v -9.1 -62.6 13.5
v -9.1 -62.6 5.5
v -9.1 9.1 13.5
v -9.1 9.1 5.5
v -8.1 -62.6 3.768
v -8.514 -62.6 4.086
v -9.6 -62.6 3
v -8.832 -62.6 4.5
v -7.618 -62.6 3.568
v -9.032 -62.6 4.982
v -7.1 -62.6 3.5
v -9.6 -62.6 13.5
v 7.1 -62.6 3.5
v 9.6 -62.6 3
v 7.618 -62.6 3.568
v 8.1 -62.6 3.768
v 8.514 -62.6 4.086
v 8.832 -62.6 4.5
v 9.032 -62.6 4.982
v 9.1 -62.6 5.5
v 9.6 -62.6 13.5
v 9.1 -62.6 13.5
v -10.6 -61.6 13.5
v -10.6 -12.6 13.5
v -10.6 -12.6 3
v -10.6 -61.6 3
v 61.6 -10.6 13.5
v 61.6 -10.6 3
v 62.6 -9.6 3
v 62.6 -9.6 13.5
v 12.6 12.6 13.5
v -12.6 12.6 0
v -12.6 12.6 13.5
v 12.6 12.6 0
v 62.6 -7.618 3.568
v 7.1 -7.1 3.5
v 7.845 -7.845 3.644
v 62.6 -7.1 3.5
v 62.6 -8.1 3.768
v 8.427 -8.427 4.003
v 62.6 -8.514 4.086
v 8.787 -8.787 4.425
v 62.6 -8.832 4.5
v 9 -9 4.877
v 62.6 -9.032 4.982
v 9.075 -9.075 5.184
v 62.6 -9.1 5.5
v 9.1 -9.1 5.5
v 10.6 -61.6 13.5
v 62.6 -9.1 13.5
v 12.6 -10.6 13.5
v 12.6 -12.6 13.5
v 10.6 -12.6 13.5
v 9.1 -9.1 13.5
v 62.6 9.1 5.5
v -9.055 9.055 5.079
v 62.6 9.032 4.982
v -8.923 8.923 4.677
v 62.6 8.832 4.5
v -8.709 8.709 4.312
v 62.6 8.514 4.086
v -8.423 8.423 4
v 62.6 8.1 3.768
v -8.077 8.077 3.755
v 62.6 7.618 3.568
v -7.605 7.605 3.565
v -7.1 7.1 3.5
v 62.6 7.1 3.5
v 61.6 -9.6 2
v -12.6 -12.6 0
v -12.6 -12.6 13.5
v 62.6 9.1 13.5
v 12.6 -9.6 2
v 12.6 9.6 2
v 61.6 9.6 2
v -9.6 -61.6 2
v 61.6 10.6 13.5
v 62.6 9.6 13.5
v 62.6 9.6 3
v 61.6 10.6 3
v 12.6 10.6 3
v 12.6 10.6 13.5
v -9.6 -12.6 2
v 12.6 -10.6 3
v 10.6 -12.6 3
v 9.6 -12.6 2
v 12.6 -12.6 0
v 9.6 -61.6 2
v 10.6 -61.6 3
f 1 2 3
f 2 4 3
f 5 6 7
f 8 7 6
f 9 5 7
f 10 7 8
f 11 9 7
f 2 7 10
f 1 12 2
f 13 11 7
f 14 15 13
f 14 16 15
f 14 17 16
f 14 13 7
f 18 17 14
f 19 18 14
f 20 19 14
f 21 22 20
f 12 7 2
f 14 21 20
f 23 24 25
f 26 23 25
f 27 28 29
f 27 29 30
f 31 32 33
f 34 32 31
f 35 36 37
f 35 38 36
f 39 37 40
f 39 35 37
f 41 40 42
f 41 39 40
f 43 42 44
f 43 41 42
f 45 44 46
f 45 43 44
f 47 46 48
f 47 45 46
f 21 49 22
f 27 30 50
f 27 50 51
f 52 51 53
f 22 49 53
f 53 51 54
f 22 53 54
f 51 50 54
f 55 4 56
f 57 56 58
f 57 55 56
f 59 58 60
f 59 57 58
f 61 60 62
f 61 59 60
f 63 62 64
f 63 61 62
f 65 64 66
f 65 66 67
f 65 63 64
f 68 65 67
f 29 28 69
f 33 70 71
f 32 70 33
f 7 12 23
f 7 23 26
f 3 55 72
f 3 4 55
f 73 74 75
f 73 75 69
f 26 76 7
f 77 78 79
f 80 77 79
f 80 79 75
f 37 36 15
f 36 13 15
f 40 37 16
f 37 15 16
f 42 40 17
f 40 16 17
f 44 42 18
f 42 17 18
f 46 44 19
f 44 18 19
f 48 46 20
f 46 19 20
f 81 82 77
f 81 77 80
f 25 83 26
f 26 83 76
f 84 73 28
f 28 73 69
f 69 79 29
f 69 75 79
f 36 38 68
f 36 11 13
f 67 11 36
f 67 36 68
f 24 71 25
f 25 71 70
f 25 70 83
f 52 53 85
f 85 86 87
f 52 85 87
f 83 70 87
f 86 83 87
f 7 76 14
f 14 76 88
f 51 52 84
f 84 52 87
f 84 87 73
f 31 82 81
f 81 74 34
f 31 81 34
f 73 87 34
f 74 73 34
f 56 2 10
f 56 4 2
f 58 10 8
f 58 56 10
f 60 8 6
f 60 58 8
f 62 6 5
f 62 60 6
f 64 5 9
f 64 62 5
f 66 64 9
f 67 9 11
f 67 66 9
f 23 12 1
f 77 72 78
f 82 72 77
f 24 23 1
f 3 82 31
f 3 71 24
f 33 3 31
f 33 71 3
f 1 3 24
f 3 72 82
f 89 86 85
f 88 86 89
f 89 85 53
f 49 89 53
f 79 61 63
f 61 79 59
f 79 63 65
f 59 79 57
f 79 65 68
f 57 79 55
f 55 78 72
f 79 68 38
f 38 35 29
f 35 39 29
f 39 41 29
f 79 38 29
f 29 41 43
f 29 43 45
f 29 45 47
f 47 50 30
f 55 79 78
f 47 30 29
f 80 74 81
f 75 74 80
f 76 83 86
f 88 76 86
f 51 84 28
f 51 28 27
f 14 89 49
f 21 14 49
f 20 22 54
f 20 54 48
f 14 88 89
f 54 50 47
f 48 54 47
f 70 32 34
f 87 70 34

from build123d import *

# Parameters (mm, degrees)
SKETCH_W        = 25.2
SKETCH_H        = 25.2
PAD_DEPTH       = 13.5
THICKNESS_T     = -3.5
SKETCH001_W     = 18.2
SKETCH001_H     = 10
POCKET_DEPTH    = 3.5
PAD001_DEPTH    = 50
CHAMFER_SIZE    = 1
SKETCH003_W     = 18.2
SKETCH003_H     = 10
POCKET001_DEPTH = 3.5
PAD002_DEPTH    = 50
CHAMFER001_SIZE = 1
FILLET_R        = 2
FILLET001_R     = 2
FILLET002_R     = 2


with BuildPart() as part:
    # Sketch → Pad (new body)
    with BuildSketch(Plane.XY):
        Rectangle(SKETCH_W, SKETCH_H)
    extrude(amount=PAD_DEPTH)

    # Thickness
    thickness_openings = [part.faces().sort_by_distance(p)[0] for p in [
        (0, 0, 13.5),
    ]]
    offset(amount=THICKNESS_T, openings=thickness_openings, kind=Kind.INTERSECTION)

    # Sketch001 (on Face2 of Thickness) → Pocket (cut)
    with BuildSketch(Plane.XZ.offset(12.6)):
        with Locations((0, 8.5)):
            Rectangle(SKETCH001_W, SKETCH001_H)
    extrude(amount=-POCKET_DEPTH, mode=Mode.SUBTRACT)

    # Sketch002 (on Face3 of Pocket) → Pad001 (join)
    with BuildSketch(Plane.XZ.offset(12.6)):
        Polygon((-10.6, 13.5), (-10.6, 2), (10.6, 2), (10.6, 13.5), (9.1, 13.5), (9.1, 3.5), (-9.1, 3.5), (-9.1, 13.5), align=None)
    extrude(amount=PAD001_DEPTH)

    # Chamfer
    chamfer_edges = [part.edges().sort_by_distance(p)[0] for p in [
        (0, -62.6, 2),
        (10.6, -37.6, 2),
        (-10.6, -37.6, 2),
        (10.6, -62.6, 7.75),
        (-10.6, -62.6, 7.75),
    ]]
    chamfer(chamfer_edges, length=CHAMFER_SIZE)

    # Sketch003 (on Face6 of Chamfer) → Pocket001 (cut)
    with BuildSketch(Plane.YZ.offset(12.6)):
        with Locations((0, 8.5)):
            Rectangle(SKETCH003_W, SKETCH003_H)
    extrude(amount=-POCKET001_DEPTH, mode=Mode.SUBTRACT)

    # Sketch004 (on Face6 of Pocket001) → Pad002 (join)
    with BuildSketch(Plane.YZ.offset(12.6)):
        Polygon((10.6, 13.5), (10.6, 2), (-10.6, 2), (-10.6, 13.5), (-9.1, 13.5), (-9.1, 3.5), (9.1, 3.5), (9.1, 13.5), align=None)
    extrude(amount=PAD002_DEPTH)

    # Chamfer001
    chamfer001_edges = [part.edges().sort_by_distance(p)[0] for p in [
        (37.6, -10.6, 2),
        (62.6, -10.6, 7.75),
        (62.6, 0, 2),
        (62.6, 10.6, 7.75),
        (37.6, 10.6, 2),
    ]]
    chamfer(chamfer001_edges, length=CHAMFER001_SIZE)

    # Fillet
    fillet_edges = [part.edges().sort_by_distance(p)[0] for p in [
        (37.6, 9.1, 3.5),
        (10.85, 9.1, 3.5),
        (0, 9.1, 3.5),
        (-9.1, 0, 3.5),
        (-9.1, -10.85, 3.5),
        (-9.1, -37.6, 3.5),
    ]]
    fillet(fillet_edges, radius=FILLET_R)

    # Fillet001
    fillet001_edges = [part.edges().sort_by_distance(p)[0] for p in [
        (9.1, -10.85, 3.5),
    ]]
    fillet(fillet001_edges, radius=FILLET001_R)

    # Fillet002
    fillet002_edges = [part.edges().sort_by_distance(p)[0] for p in [
        (37.6, -9.1, 3.5),
    ]]
    fillet(fillet002_edges, radius=FILLET002_R)


solid = part.part
